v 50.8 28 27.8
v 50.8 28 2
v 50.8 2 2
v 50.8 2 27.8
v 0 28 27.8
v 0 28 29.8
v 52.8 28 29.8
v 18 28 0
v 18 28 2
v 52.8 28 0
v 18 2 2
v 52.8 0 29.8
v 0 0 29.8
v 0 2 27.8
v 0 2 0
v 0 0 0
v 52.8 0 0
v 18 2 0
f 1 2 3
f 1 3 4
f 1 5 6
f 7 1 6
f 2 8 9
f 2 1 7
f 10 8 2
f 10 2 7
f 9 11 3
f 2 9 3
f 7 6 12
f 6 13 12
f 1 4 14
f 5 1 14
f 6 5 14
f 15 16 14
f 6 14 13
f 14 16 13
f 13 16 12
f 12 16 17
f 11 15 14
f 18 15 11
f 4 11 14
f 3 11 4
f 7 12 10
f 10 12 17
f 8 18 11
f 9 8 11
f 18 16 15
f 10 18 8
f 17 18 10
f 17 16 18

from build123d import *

# Parameters (mm, degrees)
SKETCH1_W           = 52.8
SKETCH1_H           = 29.8
BOSS_EXTRUDE1_DEPTH = 2
BOSS_EXTRUDE2_DEPTH = 26


with BuildPart() as part:
    # Sketch1 → Boss-Extrude1 (new body)
    with BuildSketch(Plane(origin=(0, 0, 0), x_dir=(1, 0, 0), z_dir=(0, 1, 0))):
        with Locations((26.4, -14.9)):
            Rectangle(SKETCH1_W, SKETCH1_H)
    extrude(amount=BOSS_EXTRUDE1_DEPTH)

    # Sketch2 → Boss-Extrude2 (add)
    with BuildSketch(Plane(origin=(0, 2, 0), x_dir=(1, 0, 0), z_dir=(0, 1, 0))):
        Polygon((0, -27.8), (0, -29.8), (52.8, -29.8), (52.8, 0), (18, 0), (18, -2), (50.8, -2), (50.8, -27.8), align=None)
    extrude(amount=BOSS_EXTRUDE2_DEPTH)


solid = part.part
